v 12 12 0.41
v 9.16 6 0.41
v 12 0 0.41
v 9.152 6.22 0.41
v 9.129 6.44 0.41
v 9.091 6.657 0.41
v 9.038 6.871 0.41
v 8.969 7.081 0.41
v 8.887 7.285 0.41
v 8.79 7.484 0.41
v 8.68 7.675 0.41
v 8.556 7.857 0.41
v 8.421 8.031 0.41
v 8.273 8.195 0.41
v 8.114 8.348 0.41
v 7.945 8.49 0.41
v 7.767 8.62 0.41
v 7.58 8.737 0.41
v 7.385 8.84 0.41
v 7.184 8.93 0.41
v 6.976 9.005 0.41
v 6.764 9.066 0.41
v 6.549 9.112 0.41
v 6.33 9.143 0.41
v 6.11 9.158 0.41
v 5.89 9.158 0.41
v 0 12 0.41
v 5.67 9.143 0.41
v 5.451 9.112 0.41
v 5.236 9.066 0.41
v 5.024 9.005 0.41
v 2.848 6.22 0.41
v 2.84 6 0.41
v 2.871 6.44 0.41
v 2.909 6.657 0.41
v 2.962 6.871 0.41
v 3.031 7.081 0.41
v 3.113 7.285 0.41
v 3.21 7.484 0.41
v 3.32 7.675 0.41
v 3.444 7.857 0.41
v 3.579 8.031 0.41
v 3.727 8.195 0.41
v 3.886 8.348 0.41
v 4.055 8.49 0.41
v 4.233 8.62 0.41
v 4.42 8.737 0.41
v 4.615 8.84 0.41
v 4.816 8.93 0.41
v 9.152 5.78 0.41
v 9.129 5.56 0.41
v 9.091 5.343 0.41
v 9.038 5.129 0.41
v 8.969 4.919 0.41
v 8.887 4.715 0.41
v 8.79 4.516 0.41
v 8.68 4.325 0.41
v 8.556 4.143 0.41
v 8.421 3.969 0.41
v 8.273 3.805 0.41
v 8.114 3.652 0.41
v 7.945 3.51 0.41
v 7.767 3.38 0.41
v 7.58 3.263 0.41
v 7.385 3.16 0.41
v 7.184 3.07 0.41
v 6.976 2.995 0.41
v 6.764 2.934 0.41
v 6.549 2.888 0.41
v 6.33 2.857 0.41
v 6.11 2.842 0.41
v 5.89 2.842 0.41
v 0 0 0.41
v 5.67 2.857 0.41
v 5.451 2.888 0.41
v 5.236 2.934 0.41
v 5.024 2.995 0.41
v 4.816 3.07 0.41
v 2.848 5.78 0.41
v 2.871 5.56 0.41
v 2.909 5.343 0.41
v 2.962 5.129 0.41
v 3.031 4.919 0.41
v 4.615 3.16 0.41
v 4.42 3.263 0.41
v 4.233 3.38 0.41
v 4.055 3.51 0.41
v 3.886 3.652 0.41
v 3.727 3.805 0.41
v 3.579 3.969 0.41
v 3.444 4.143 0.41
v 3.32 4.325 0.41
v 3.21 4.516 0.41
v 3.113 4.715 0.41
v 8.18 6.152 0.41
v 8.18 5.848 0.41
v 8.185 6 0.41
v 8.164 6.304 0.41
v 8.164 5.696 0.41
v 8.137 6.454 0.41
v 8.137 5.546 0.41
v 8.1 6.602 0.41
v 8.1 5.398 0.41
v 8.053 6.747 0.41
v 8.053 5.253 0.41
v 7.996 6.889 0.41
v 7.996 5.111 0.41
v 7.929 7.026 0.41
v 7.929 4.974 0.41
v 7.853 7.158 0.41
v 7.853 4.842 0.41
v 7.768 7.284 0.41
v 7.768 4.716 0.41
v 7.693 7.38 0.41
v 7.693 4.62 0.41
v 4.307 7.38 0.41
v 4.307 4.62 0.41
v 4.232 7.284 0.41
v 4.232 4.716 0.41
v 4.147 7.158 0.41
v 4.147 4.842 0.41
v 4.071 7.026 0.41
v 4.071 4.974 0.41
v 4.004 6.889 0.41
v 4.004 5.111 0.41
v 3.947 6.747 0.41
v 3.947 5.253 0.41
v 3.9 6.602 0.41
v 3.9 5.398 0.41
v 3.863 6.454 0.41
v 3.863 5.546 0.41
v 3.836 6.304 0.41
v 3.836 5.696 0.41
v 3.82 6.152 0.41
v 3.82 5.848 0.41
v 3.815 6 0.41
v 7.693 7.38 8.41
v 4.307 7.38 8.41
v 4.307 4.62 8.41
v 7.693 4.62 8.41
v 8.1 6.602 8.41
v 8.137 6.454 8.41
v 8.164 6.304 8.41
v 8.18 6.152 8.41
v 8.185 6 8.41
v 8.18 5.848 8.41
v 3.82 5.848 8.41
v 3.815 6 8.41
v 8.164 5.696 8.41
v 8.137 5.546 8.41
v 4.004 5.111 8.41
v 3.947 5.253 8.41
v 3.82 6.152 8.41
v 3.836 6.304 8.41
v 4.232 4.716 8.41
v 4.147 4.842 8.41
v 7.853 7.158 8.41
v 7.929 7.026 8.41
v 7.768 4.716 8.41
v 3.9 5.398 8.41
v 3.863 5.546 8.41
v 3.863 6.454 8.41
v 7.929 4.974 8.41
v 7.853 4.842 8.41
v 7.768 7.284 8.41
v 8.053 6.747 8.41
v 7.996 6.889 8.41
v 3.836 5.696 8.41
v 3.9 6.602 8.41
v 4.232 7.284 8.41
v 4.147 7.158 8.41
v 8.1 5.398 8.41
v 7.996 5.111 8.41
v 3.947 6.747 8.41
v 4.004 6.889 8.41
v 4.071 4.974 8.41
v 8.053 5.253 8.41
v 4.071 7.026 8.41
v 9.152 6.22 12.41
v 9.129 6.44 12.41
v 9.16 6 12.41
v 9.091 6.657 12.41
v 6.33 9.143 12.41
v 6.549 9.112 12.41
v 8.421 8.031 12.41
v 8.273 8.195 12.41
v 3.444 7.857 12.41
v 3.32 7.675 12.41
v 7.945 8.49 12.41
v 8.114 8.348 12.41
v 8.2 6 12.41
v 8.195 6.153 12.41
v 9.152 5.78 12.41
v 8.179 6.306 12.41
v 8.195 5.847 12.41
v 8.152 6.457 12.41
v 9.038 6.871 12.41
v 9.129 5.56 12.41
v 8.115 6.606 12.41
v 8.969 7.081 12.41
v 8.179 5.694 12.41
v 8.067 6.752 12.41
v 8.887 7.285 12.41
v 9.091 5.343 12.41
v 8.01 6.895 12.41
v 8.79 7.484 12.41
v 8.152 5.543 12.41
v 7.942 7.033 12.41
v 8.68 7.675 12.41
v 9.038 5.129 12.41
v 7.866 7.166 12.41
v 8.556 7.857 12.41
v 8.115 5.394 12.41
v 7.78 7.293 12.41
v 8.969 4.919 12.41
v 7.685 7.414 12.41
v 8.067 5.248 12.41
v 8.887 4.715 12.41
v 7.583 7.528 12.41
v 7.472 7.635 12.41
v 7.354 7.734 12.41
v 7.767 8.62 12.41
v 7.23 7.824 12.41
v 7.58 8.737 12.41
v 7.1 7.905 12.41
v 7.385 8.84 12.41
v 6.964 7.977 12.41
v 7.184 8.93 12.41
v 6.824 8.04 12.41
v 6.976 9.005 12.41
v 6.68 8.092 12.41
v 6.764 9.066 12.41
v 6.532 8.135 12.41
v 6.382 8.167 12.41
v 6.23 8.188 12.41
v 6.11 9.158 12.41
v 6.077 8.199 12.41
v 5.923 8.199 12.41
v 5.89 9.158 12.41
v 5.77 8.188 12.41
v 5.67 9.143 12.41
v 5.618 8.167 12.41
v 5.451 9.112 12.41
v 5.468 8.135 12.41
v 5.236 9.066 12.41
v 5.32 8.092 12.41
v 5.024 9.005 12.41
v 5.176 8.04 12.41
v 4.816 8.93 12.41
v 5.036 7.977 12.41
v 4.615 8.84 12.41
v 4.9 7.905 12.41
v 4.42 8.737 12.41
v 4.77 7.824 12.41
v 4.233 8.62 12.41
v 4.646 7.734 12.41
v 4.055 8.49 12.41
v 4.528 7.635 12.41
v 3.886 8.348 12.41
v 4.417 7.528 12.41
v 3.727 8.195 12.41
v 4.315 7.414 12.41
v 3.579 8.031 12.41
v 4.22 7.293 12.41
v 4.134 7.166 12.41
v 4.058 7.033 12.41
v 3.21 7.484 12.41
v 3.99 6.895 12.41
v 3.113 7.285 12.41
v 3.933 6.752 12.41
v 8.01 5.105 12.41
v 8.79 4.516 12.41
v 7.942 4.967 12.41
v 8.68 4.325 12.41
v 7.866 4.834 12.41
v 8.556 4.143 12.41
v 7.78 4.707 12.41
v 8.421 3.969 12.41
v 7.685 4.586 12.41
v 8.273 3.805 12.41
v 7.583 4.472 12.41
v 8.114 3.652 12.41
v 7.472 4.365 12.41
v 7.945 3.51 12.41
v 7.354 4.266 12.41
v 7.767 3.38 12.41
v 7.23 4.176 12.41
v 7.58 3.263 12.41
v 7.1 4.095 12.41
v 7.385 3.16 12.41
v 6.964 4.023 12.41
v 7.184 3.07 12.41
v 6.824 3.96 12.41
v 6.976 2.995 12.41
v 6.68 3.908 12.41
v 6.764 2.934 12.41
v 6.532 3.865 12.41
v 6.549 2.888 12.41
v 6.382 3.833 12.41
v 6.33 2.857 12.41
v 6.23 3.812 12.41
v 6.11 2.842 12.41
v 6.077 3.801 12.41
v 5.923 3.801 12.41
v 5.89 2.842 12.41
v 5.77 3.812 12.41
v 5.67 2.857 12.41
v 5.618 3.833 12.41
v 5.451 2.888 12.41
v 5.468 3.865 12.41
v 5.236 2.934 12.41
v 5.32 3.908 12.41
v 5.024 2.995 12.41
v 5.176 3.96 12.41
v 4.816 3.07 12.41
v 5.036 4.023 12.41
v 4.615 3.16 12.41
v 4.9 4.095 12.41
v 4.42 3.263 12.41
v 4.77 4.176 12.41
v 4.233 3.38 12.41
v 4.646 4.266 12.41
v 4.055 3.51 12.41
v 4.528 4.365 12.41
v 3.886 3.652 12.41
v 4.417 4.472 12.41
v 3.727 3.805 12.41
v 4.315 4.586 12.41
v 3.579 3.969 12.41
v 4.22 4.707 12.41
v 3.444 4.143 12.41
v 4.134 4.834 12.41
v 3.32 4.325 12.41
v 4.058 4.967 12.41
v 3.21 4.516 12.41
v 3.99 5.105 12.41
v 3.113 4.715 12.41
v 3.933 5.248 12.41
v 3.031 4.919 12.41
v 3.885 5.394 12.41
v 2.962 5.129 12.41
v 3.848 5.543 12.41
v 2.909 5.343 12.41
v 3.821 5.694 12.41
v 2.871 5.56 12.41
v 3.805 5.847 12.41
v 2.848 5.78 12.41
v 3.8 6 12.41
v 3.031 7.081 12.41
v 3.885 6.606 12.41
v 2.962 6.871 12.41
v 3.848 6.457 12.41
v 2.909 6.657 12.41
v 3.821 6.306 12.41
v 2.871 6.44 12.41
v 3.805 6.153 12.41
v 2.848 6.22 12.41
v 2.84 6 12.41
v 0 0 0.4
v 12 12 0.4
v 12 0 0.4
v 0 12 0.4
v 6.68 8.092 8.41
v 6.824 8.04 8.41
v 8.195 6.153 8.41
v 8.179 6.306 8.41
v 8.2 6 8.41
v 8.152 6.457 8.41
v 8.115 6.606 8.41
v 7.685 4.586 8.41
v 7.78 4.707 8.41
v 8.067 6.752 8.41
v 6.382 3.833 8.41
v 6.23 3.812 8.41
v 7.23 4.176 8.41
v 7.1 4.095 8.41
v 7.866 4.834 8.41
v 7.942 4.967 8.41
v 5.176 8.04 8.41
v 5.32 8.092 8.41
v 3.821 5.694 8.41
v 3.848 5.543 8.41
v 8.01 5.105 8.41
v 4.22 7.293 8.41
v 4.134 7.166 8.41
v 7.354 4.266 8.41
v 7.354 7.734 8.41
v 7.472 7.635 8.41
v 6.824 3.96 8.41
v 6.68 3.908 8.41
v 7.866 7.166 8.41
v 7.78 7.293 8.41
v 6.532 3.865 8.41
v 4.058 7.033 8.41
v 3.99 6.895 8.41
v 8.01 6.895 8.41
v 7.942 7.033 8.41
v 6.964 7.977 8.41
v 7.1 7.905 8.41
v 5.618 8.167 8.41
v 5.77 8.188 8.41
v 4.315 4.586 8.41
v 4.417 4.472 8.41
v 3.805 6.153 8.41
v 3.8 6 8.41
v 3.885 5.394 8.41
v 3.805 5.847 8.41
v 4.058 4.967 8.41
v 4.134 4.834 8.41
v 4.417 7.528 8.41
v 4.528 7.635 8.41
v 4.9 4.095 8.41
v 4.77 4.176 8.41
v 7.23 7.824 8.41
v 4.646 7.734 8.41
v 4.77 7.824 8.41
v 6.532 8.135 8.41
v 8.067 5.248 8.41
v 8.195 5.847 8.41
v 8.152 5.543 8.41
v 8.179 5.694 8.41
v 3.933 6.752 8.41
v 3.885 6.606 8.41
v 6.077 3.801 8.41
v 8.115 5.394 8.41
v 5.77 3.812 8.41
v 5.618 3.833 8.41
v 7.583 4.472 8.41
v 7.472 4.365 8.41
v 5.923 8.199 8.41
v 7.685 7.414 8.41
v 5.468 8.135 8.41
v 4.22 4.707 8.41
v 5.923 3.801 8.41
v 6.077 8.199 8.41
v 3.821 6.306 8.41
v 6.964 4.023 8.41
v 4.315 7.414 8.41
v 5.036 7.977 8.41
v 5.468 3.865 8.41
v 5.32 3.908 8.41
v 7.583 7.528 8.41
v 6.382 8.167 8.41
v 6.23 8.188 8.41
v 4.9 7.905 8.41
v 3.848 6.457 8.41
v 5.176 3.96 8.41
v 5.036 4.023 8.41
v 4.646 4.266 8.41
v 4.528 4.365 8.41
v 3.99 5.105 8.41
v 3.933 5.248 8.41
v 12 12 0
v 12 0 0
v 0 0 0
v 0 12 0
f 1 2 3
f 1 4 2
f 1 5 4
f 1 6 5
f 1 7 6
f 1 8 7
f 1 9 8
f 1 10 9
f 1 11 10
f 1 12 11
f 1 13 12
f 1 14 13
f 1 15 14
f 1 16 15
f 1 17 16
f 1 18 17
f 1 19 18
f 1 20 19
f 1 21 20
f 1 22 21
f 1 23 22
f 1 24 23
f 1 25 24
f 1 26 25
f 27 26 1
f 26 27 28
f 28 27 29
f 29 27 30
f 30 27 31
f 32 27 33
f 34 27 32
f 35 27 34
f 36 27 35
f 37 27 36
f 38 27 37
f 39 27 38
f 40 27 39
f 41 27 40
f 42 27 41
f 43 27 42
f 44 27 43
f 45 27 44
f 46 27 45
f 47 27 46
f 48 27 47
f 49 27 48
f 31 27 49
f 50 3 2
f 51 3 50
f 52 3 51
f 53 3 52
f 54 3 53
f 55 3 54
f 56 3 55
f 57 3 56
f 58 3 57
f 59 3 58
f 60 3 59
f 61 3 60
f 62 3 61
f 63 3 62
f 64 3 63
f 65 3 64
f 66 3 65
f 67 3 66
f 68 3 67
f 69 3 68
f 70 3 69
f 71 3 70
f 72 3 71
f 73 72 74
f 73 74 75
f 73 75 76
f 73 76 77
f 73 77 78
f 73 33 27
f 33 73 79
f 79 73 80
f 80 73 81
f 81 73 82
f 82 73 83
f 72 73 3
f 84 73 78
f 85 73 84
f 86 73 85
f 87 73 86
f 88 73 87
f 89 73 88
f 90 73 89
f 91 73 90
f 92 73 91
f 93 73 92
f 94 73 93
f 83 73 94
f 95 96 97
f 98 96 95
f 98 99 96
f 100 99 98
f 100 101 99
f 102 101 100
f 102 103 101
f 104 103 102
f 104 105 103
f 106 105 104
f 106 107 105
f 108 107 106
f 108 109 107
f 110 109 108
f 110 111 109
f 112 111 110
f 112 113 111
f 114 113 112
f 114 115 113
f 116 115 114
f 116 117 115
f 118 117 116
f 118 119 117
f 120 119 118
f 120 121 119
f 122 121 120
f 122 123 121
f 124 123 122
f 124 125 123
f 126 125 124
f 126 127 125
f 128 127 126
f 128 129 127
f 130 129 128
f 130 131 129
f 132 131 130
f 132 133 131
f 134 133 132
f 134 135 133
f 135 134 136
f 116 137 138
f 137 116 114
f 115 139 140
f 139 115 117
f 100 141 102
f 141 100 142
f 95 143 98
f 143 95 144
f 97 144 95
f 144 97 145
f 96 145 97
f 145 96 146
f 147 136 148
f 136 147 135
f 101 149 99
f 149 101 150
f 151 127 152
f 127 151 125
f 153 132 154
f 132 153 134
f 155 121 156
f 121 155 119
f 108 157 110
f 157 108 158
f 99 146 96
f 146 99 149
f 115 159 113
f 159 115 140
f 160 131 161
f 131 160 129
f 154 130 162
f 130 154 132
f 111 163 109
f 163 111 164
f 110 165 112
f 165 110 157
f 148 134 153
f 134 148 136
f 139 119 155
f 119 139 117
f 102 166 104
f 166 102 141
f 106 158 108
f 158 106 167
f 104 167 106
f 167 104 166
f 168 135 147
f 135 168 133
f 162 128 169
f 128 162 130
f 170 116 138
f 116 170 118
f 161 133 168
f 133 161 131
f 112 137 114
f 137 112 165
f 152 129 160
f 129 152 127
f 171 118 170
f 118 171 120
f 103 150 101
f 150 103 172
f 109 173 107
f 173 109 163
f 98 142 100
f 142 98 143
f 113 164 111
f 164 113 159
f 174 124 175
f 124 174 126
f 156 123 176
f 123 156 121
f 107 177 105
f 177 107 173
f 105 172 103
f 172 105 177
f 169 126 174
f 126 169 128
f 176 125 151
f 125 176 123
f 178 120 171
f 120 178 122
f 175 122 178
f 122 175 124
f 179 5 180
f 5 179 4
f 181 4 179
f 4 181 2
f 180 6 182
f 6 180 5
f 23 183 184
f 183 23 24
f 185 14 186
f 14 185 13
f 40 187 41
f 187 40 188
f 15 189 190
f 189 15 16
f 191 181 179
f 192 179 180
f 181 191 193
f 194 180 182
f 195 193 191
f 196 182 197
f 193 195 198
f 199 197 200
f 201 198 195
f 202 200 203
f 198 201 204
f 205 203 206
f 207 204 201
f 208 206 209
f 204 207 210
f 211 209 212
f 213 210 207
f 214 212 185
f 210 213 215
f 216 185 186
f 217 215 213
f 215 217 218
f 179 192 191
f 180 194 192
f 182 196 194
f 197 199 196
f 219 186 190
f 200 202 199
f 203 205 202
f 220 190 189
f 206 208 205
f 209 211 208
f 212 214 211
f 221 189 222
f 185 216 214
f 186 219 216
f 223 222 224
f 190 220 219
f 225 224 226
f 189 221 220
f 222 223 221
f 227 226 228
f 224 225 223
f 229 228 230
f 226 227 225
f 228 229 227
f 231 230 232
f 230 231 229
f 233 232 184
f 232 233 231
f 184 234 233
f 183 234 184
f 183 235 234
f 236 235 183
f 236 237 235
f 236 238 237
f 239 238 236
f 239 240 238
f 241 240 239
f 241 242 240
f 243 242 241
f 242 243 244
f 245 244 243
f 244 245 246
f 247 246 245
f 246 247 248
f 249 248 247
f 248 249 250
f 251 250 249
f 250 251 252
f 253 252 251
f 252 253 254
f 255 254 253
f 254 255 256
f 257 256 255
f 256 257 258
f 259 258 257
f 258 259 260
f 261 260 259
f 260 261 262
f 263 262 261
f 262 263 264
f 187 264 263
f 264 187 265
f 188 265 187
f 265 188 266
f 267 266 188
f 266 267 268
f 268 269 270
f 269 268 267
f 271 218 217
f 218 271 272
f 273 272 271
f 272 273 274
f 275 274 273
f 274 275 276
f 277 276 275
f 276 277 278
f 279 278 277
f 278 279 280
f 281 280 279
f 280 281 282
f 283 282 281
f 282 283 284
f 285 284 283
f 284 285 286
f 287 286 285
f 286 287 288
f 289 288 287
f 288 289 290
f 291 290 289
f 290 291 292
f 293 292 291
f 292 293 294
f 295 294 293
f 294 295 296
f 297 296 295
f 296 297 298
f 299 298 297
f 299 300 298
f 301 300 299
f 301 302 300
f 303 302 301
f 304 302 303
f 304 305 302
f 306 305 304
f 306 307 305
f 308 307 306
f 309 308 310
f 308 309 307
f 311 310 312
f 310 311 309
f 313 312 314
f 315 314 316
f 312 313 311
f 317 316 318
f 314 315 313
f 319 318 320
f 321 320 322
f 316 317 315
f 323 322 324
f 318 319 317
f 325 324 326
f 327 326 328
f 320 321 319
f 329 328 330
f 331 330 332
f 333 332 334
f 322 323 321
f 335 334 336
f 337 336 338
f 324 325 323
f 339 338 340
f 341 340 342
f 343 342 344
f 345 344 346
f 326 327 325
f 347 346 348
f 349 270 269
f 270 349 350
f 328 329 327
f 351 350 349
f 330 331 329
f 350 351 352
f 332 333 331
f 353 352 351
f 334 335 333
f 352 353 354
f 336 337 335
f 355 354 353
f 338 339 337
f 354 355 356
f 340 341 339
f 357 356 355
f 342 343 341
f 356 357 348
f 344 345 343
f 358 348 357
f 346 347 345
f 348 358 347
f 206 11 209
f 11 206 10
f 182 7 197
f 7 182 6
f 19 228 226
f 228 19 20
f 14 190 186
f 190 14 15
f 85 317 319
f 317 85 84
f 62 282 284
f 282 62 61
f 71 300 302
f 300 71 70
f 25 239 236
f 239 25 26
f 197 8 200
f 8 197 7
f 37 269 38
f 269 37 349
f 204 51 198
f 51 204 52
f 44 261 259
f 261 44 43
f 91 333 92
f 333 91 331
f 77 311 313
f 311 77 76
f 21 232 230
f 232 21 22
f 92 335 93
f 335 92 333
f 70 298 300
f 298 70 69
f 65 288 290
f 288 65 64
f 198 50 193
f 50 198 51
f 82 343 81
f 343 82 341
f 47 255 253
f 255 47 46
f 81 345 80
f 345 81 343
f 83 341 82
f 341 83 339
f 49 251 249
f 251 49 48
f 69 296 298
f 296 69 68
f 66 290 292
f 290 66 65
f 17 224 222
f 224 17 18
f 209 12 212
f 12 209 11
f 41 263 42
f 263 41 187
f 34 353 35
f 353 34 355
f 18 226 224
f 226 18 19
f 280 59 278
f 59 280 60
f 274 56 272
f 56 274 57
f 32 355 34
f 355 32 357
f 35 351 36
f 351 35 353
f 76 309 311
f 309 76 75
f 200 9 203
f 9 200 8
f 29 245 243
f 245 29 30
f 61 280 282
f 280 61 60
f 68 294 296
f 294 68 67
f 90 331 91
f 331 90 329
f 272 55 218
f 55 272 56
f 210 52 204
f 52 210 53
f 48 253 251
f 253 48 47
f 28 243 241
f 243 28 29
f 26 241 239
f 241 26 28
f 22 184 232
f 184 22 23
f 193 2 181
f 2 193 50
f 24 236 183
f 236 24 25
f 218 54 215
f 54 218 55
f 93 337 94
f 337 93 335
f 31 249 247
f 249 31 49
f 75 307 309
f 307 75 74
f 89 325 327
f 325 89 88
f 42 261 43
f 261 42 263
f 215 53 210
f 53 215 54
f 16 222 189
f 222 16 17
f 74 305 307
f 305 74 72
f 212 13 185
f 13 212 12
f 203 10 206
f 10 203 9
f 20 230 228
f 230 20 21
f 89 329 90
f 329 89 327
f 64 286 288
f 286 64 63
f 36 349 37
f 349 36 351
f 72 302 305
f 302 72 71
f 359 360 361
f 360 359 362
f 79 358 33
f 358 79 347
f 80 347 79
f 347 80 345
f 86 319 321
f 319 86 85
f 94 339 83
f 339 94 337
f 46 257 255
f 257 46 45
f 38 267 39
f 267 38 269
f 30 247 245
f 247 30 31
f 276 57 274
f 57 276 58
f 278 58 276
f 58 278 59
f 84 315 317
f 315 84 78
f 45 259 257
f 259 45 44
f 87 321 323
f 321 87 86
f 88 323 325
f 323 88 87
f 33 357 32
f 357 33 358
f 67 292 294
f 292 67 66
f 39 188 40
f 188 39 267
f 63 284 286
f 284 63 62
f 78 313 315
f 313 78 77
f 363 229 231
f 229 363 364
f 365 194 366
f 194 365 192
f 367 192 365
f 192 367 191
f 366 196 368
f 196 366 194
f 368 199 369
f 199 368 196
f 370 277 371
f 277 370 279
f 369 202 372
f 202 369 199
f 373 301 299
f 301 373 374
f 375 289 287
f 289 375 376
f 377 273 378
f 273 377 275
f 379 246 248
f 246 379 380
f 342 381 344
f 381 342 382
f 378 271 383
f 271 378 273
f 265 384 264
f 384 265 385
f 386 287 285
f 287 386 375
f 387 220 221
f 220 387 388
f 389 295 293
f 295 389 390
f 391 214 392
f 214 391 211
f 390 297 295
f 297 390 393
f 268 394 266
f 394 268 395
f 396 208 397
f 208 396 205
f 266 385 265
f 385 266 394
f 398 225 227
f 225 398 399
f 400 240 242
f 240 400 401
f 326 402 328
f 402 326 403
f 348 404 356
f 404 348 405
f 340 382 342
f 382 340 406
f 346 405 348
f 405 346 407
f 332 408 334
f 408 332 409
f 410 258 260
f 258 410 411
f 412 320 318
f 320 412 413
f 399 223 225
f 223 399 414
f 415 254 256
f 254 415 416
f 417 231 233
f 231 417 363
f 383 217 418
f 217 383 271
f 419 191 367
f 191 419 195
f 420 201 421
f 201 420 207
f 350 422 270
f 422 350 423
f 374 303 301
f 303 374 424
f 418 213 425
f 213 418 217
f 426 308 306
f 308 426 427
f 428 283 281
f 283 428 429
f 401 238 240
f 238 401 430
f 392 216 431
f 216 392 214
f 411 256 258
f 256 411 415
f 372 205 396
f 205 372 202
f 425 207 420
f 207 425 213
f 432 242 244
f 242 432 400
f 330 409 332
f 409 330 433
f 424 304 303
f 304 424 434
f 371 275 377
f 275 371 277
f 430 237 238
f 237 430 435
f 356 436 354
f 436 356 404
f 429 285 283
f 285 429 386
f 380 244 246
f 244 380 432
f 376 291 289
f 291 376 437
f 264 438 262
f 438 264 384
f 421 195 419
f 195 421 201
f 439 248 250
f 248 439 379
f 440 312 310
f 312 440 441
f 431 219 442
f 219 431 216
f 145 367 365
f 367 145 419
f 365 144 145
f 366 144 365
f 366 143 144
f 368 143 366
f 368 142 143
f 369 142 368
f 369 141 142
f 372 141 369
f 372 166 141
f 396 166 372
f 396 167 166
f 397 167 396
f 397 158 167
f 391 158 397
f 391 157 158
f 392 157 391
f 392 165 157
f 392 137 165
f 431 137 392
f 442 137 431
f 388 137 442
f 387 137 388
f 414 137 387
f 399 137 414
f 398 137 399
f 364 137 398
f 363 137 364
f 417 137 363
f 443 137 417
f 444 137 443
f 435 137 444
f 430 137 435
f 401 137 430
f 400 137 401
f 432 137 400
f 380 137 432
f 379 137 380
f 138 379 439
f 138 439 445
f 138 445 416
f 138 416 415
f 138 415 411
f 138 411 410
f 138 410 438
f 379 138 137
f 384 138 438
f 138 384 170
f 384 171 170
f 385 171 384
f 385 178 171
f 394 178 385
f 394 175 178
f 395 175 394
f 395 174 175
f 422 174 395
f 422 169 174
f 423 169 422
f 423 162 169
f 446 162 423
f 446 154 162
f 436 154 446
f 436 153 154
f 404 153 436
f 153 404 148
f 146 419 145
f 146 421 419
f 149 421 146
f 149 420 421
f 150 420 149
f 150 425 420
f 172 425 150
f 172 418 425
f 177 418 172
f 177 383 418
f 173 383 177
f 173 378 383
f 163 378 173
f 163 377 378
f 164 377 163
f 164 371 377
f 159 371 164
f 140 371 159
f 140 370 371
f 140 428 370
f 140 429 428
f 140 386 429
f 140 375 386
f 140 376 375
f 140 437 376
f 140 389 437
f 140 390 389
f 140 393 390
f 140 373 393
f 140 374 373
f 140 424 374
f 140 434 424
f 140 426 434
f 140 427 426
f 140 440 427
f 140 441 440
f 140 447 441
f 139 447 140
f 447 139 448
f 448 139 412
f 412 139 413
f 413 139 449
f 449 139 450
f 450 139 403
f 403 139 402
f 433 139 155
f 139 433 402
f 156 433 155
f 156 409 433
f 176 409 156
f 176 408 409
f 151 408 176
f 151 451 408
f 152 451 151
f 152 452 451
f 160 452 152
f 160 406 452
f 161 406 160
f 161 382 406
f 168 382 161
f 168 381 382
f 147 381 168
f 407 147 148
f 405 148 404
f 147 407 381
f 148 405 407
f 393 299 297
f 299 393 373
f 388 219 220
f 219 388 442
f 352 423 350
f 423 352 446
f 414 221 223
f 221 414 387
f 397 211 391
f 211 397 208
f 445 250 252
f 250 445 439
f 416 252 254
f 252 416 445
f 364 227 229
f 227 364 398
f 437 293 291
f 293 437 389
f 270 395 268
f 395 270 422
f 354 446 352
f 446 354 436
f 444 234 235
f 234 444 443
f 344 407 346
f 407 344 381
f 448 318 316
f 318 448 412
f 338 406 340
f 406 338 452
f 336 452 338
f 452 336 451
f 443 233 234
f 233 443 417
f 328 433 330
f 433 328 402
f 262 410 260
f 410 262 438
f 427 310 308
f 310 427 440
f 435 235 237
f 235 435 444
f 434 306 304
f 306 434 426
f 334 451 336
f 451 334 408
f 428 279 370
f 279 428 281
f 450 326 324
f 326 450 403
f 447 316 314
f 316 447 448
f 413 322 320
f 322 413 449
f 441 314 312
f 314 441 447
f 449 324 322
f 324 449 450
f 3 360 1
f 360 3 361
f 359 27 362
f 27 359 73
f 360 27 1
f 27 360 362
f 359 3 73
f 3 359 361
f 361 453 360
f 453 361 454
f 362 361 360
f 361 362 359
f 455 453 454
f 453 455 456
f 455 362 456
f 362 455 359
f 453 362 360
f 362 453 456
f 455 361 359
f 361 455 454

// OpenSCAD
// file: ../../Base/PlacementOptions.scad
// Fischertechnik Box Foundation
// Placement Options

// Alignment
NoAlign = 0;
AlignLeft = 1;
AlignBottom = 2;
AlignCenter = 3;
AlignRight = 4;
AlignTop = 5;

// Element rotation degree steps
rotations = [0, -90, -180, -270];

// Rotation
NoRotation = 0;
Rotate0 = 0;
Rotate90 = 1;
Rotate180 = 2;
Rotate270 = 3;

// Docking (seen from above)
NoDock = -1;
DockLeft = 0;
DockTop = 1;
DockRight = 2;
DockCorner = 2;
DockBottom = 3;

// Web corners
LowerLeft = 0;
UpperLeft = 1;
UpperRight = 2;
LowerRight = 3;

// Web position relative to corner
LeftOfCorner = 0;
RightOfCorner = 1;

// Rails direction
Horizontal = true;
Vertical = false;
// file: ../../Base/Boxes.scad
// Fischertechnik Box Foundation
// Pre-designed Boxes

use <Constants.scad>

include <PlacementOptions.scad>

box190Width = 190;
box190Depth = 130;
box130Width = 130;
box130Depth = 95;

// Values are from an original ec3 box
topBottomDifference = 1.5;
outerHeight = 40;
baseThickness = 1.8;
innerHeight = outerHeight - baseThickness;
stackExcess = 5.7;
radius = 3.5;
wallThickness = 1.5;
tolerance = 0.2;

boxWallThickness = wallThickness;
boxBaseThickness = baseThickness;
boxWebWidth = 3.0;

// getBoxWallThickness()
// Gets the wall thickness of a Fischertechnik Box
function getBoxWallThickness() = boxWallThickness;

// getBoxUsageHeight(height = 38.2)
// Gets the usable height of a Fischertechnik box
// height = Outer height of the box from the bottom to the upper edge.
function getBoxUsageHeight(height = outerHeight) = height - baseThickness - stackExcess;

// getBoxInnerHeight()
// Gets the inner height of a Fischertechnik box, including the stack excess
function getBoxInnerHeight() = innerHeight;

// getBoxBaseThickness()
// Gets the thickness of the Fischertechnik box base.
function getBoxBaseThickness() = boxBaseThickness;

// getBoxWebWidth()
// Gets the width of a box web
function getBoxWebWidth() = boxWebWidth;

// getBox190Space()
// Gets the usable inner space of a Box 190 as an x/y-list
function getBox190Space() = [
    box190Width - 2*getBoxWallThickness() - topBottomDifference, 
    box190Depth - 2*getBoxWallThickness() - topBottomDifference ];

// RoundedCornerPlate(width, depth, height, radius)
// Creates a body plate with rounded corners for a box. Used
// also to create the complete box with the hull module.
// width = Width of the plate
// depth = depth of the plate 
// height = thickness of the plate
// radius = radius of the rounded corner
module RoundedCornerPlate(width, depth, height, radius) {
    translate([radius, radius])
    hull() {
        w = width-2*radius;
        d = depth-2*radius;
        cube([w, d, height]);
        cylinder(height, r=radius, $fn=getFragments());
        translate([w, 0])
            cylinder(height, r=radius, $fn=getFragments());
        translate([w, d])
            cylinder(height, r=radius, $fn=getFragments());
        translate([0, d])
            cylinder(height, r=radius, $fn=getFragments());
    }
}

// BoxBase(width, depth)
// Creates an empty stackable Fischertechnik compatible box
// width = Outer width of the box (190, 130, ...)
// depth = Outer depth of the box (130, 95, ...)

module BoxBase(width, depth, height=outerHeight) {    
    thinPlate = 0.01;

    innerHeight = height - baseThickness;    
    
    module Body(tolerance=tolerance) {
        hull() {
            // Bottom with tolerance to fit into the original boxes when stacked
            translate([-wallThickness+tolerance, -wallThickness+tolerance, -baseThickness])
                RoundedCornerPlate(width-topBottomDifference-2*tolerance, depth-topBottomDifference-2*tolerance, thinPlate, radius);
            
            // Top
            translate([-wallThickness-topBottomDifference/2, -wallThickness-topBottomDifference/2, innerHeight-thinPlate])
                RoundedCornerPlate(width, depth, thinPlate, radius);
         }
    }

    module Cutoff() {
        hull() {
            coWidth = width - 2*wallThickness;
            coDepth = depth - 2*wallThickness;
            
            // Bottom
            RoundedCornerPlate(coWidth-topBottomDifference, coDepth-topBottomDifference, thinPlate, radius);

            // Top
            translate([-topBottomDifference/2, -topBottomDifference/2, innerHeight+thinPlate]) 
                RoundedCornerPlate(coWidth, coDepth, thinPlate, radius);
        }
    }
    
    difference() {        
        Body();
        Cutoff();
        stackOffset = innerHeight - stackExcess;
        translate([0, 0, stackOffset + baseThickness])
            Body(tolerance=0);
    }
}

// Creates the Fischertechnik empty box 130x190 mm and places it at position 0,0
// 190x130 are the outer sizes, the inner space is slightly smaller. Use getBox190Space() to get the inner sizes.
// The box is positioned that the usable inner space is at the 0,0,0 position.

module Box190() {
    BoxBase(box190Width, box190Depth);
}

// Gets the usable inner space of a Box 130 as an x/y-list
function getBox130Space() = [
    box130Width - 2*getBoxWallThickness() - topBottomDifference, 
    box130Depth - 2*getBoxWallThickness() - topBottomDifference ];

// Creates the Fischertechnik empty box 95x130 mm and places it at position 0,0
// 190x130 are the outer sizes, the inner space is slightly smaller. Use getBox190Space() to get the inner sizes.
// The box is positioned that the usable inner space is at the 0,0,0 position.

module Box130() {
    BoxBase(box130Width, box130Depth);
}

// Creates a web at the specified box walls
// corner 0 = LowerLeft, 1 = UpperLeft, 2 = UpperRight, 3 = LowerRight
// side 0 = LeftOfCorner, 1 = RightOfCorner
// distance = Distance in mm from the corner
// boxSpace = inner width and depth of the box (default: Box 190)
// webWidth = length of the web (default is 3 mms)
// webThickness = thickness of the web (default is 1 mm)
// height = Height of the web (standard is getBoxUsageHeight())
// sink = How much of the web is sunk into the wall

module BoxWeb(
    corner, 
    side, 
    distance, 
    boxSpace=getBox190Space(), 
    webWidth=getBoxWebWidth(), 
    webThickness=1.0, 
    height=getBoxUsageHeight(),
    sink = getBoxWallThickness()/2) {
    width = (corner % 2 == 0) ? 
            (side == LeftOfCorner ? webWidth : webThickness) :
            (side == LeftOfCorner ? webThickness : webWidth);

    depth = (corner % 2 == 0) ? 
            (side == RightOfCorner ? webWidth : webThickness) :
            (side == RightOfCorner ? webThickness : webWidth);
    
    xDiff = corner == LowerLeft ? 
                (side == LeftOfCorner ? -sink : distance) :
            (corner == UpperLeft ?                
                (side == LeftOfCorner ? distance : -sink) :
            (corner == UpperRight ?
                (side == LeftOfCorner ? boxSpace.x-webWidth+sink : boxSpace.x-distance-webThickness) :
                (side == LeftOfCorner ? boxSpace.x-distance-webThickness: boxSpace.x-webWidth+sink)));

    yDiff = corner == LowerLeft ? 
                (side == RightOfCorner ? -sink : distance) :
            (corner == UpperLeft ?
                (side == RightOfCorner ? boxSpace.y-distance-webThickness : boxSpace.y-webWidth+sink) :
            (corner == UpperRight ?
                (side == RightOfCorner ? boxSpace.y-webWidth+sink : boxSpace.y-distance-webThickness) :
                (side == RightOfCorner ? distance : -sink)));
    
    translate([xDiff, yDiff, -getExcess()])
        cube([width, depth, height + 2*getExcess()]);
}
// file: ../../Base/Rotation.scad
// Fischertechnik Box Foundation
// Geometry Helpers Rotation

include <PlacementOptions.scad>

// getRotatedSpace(space, rotation=NoRotation)
// Rotates the space dependent on the specified rotation

function getRotatedSpace(space, rotation=NoRotation) = [
    (rotation == Rotate90 || rotation == Rotate270) ? space.y : space.x,
    (rotation == Rotate90 || rotation == Rotate270) ? space.x : space.y
];

// Rotates the given space around the fixed left lower corner
// space = the space the children needs as width/depth list [width,depth]
// rotation = 0 Rotate0 degrees, 1 Rotate90 degrees, 2 Rotate180 degrees, 3 Rotate270 degrees (equivalent to -90)

module RotateFix(space, rotation=NoRotation) {
    dy = (rotation == Rotate0 || rotation == Rotate270) ? 0 :
        (rotation == Rotate90) ? space.x :
        space.y;
    dx = (rotation < Rotate180) ? 0 :
        (rotation == Rotate180) ? space.x :
        space.y;
    
    translate([dx, dy, 0])
        rotate([0, 0, rotations[rotation]])
            children();
}
// file: ../../Base/Alignment.scad
// Fischertechnik Box Foundation
// Geometry Helpers Alignment

include <PlacementOptions.scad>

// getAlignedX(elementWidth, spaceWidth, align=AlignRight, offset=0)
// Gets the aligned X offset of an element with the given
// width in the given space.
// elementWidth = The width of the element to positon
// spaceWidth = The space where the element should be aligned
// align = 0 AlignLeft, 1 AlignCenter, 2 AlignRight
// offset = an optional offset from the aligned position. When
// aligned left or centered, then positive values are in X direction.
// When aligned right then positive values are in negative X direction.

function getAlignedX(elementWidth, spaceWidth, align=AlignRight, offset=0) =
    (align == AlignLeft) ?
        offset :
        ((align == AlignCenter) ?
        (spaceWidth - elementWidth)/2 + offset :
        spaceWidth - offset - elementWidth);

// getAlignedY(elementDepth, spaceDepth, align=AlignTop, offset=0)
// Gets the aligned Y offset of an element with the given
// depth in the given space.
// elementDepth = The depth of the element to positon
// spaceDepth = The space where the element should be aligned
// align = 0 AlignBottom, 1 AlignCenter, 2 AlignTop
// offset = an optional offset from the aligned position. When
// aligned bottom or centered, then positive values are in Y direction.
// When aligned top then positive values are in negative Y direction.

function getAlignedY(elementDepth, spaceDepth, align=AlignTop, offset=0) =
    (align == AlignBottom) ?
        offset :
        ((align == AlignCenter) ?
        (spaceDepth - elementDepth)/2 + offset :
        spaceDepth - offset - elementDepth);
// file: ../../Base/Placement.scad
// Fischertechnik Box Foundation
// Geometry Helpers Placement

use <Constants.scad>
use <Alignment.scad>
use <Rotation.scad>
use <Boxes.scad>

include <PlacementOptions.scad>

// Place(x=0, y=0, elementSpace=[0,0], alignX=AlignLeft, alignY=AlignBottom, rotation=Rotate0, boxSpace=getBox190Space())
// Places the child at the specified position
// y = Y-Position. This is a relative position when an X aligment is specified.
// x = X-Position. This is a relative position when an Y aligment is specified.
// elementSpace = space of the element to be placed [x,y]
// alignX = -1=NoAlign, 0 AlignLeft, 1 AlignCenter, 3 AlignRight (elementSpace and boxSpace required!)
// alignY = -1=NoAlign, 2 AlignBottom, 1 AlignCenter, 4 AlignTop (elementSpace and boxSpace required!)
// rotation = 0 Rotate0 0 degrees, 1 Rotate90 90 degrees, 
// 2 Rotate180 180 degrees, 3 Rotate270 270 degrees (equivalent to -90)
// boxSpace = Inner space of the box where the placement occurs [x,y] - default is Box 190x130 inner space

module Place(x=0, y=0, elementSpace=[0,0], 
  alignX=AlignLeft, alignY=AlignBottom, 
  rotation=NoRotation, boxSpace=getBox190Space()) {

    module Position(x, y, space, rotation=Rotate0) {
        translate([x, y, 0])
            RotateFix(space, rotation)
                children();
    }

    space = getRotatedSpace(elementSpace, rotation);
    alignedX = getAlignedX(space.x, boxSpace.x, alignX, x);
    alignedY = getAlignedY(space.y, boxSpace.y, alignY, y);
    Position(alignedX, alignedY, elementSpace, rotation)
        children();
}

// Center(space=getBox130Space(), elementSpace=[0,0])
// space = Space where the children is centered. For cylinder use centered=true and no elementSpace.
// elementSpace = space of the element to be centered [x,y]

module Center(space=getBox190Space(), elementSpace=[0,0]) {
    Place(elementSpace=elementSpace, boxSpace=space, alignX=AlignCenter, alignY=AlignCenter)
        children();
}

// CenterHorizontal(width=0, y=0, offset=0, space=getBox130Space())
// width = Width of the element to be placed.
// y = Y position of the element
// offset = Offset from the center position (negative will be left of the center)
// space = Space where the element is placed

module CenterHorizontal(width=0, y=0, offset=0, space=getBox190Space()) {
    Place(x=offset, y=y, elementSpace=[width, 0], boxSpace=space, alignX=AlignCenter)
        children(0);
}

// CenterVertical(depth=0, x=0, offset=0, space=getBox130Space())
// depth = Depth of the element to be placed.
// x = X position of the element
// offset = Offset from the center position (negative will be down of the center)
// space = Space where the element is placed

module CenterVertical(depth=0, x=0, offset=0, space=getBox190Space()) {
    Place(x=x, y=offset, elementSpace=[0, depth], boxSpace=space, alignY=AlignCenter)
        children(0);
}

// getIsVertical(align)
// True if the specified alignment needs a vertical orientation for a divider (AlignRight, AlignLeft)

function getIsVertical(align) = (align == AlignRight || align == AlignLeft);

// getIsHorizontal(align)
// True if the specified alignment needs a horizontal orientation for a divider (AlignTop, AlignBottom)

function getIsHorizontal(align) = (align == AlignTop || align == AlignBottom);
// file: ../../Elements/AxisClip10.scad
// Fischertechnik Box Library
// Axis for clip 10
// 31023

use <../ModelBase/Simple.scad>
use <../Base/Constants.scad>

/* [Element Parameters] */
height = 23;
clipHeight = 10;

/* [Hidden] */
width = 12;
depth = 12;
upperDiameter = 3.6;

// getAxisClip10Space()
// Gets the space of a n axis for a clip 10 with spring ring (mot2)

function getAxisClip10Space() = [width, depth, height];

// AxisClip10(height, clipHeight)
// Axis for clip 10 with spring ring (mot2)
// height = Height of the complete axis (standard is 23, in mot3 its only 12)
// clipHeight = Height of the part for the clip (standard is 10, in mot3 its only 7)

module AxisClip10(height=height, clipHeight=clipHeight) {
    LeveledAxisWithSpace(height, height-clipHeight, getAxisClip10Space(), diameter=upperDiameter);
}

// Test
color("lightgray")
AxisClip10(height, clipHeight);
// file: ../../Base/Constants.scad
// Fischertechnik Box Foundation
// Constants

// Constant values necessary for multiple elements

// Base constants
dividerThickness = 1.2;
excess = 0.01;
fragments = 90;
tolerance = 0.8;

// Gets the thickness of a divider 
function getDividerThickness() = dividerThickness;

// Gets the excess that is used to merge walls into each other
function getExcess() = excess;

// Gets amount of fragments of a cylinder
function getFragments() = fragments;

// Gets the inner tolerance of a frame to each side
function getTolerance() = tolerance;


// Fischertechnik specific constants
axisDiameter = 4;
axisBottomDiameter = axisDiameter + 1;
axisTolerance = 0.2;
axisLockingLength = 8;

// Gets axis diameter of Fischertechnik axis
function getAxisDiameter() = axisDiameter;

// Gets axis diameter tolerance (subtracted for element axis)
function getAxisTolerance() = axisTolerance;

// Gets the axis diameter for standing axis
function getStandAxisDiameter() = getAxisDiameter() - getAxisTolerance();

// Gets axis bottom diameter for thicker part at the bottom
function getAxisBottomDiameter() = axisBottomDiameter;

// Gets the lengthh of the locking part of a locking axis
function getAxisLockingLength() = axisLockingLength;

// Studs

studHeight = 2.5;
studTolerance = 0.2;
studRailDistance = 9;   // as in ft 50

// gets the height of a connecting stud
function getStudHeight() = studHeight;

// gets the connecting stud height tolerance
function getStudTolerance() = studTolerance;

// gets the default rail distance for studs
function getStudRailDistance() = studRailDistance;

// Dockable Frame with Edge

standardEdgeDistance = 2.5;
standardWebDistance = 11.5;
standardCornerLength = 15;

// gets the standard distance to the wall of the box for dockable frames with webs
function getStandardEdgeDistance() = standardEdgeDistance;

// gets the standard distance of each web to the corner of the dockable frame
function getStandardWebDistance() = standardWebDistance;

// gets the standard length of the corner walls of a dockable frame
function getStandardCornerLength() = standardCornerLength;

// Tubes

tubeWallFactor = 0.8;

// gets the wall thickness of a tube.
function getTubeWallThickness() = tubeWallFactor * getDividerThickness();

// Small Parts and Divider Frame

smallPartsFrameHeight = 20;

// gets the frame height for docked small parts boxes.
function getSmallPartsFrameHeight() = smallPartsFrameHeight;

// Hubs

hubRingDiameter = 19.5;
hubRingLevelDiameter = 21;

// gets the diameter of a tube matching the inner ring of a wheel
function getHubRingDiameter() = hubRingDiameter;

// gets the diameter of a hub tube with a thicker diameter
function getHubRingLevelDiameter() = hubRingLevelDiameter;

// Struts

strutAddLength = 9.0;
strutDepth = 8.0;

// gets the full length of a strut
function getFullStrutLength(length) = length + strutAddLength;

// gets the radius of the end of a strut
function getStrutEndRadius() = strutAddLength / 2;

// gets the the depth of a strut
function getStrutDepth() = strutDepth;

// Propeller

propellerAxisDiameter = 7.0;
propellerAxisTolerance = 0.2;

// gets the propeller axis outer diameter
function getPropellerAxisDiameter() = propellerAxisDiameter;

// gets the propeller axis printing tolerance
function getPropellerAxisTolerance() = propellerAxisTolerance;
// file: ../../Elements/CylinderLockingBevelGear.scad
// Fischertechnik Box Library
// Cylinder for standing locking bevel gear
// 35061

use <../Base/Constants.scad>
use <../Base/Placement.scad>
use <../ModelBase/Simple.scad>

/* [Hidden] */
width = 12;
depth = 12;
height = 12;

// getCylinderLockingBevelGearSpace()
// Gets the space the cylinder for a locking bevel gear

function getCylinderLockingBevelGearSpace() = [width, depth, height];

// CylinderLockingBevelGear()
// Standing cylinder for a locking bevel gear
// 35061

module CylinderLockingBevelGear() {
    Space(getCylinderLockingBevelGearSpace());
    
    Center(getCylinderLockingBevelGearSpace())
        LockingTube(height);
}

// Tests
color("lightgray")
CylinderLockingBevelGear();
// file: ../TestPrint.scad
// 3D Print Test Base

use <../Base/Constants.scad>

use <../Elements/AxisClip10.scad>

module TestPrint(elementSpace) {
    cube([elementSpace.x, elementSpace.y, 0.4]);
    translate([0,0,0.4+getExcess()]) {
        children();
    }
}

TestPrint(getAxisClip10Space())
    AxisClip10();
// main file
// 3D Print Test
// CylinderLockingBevelGear

use <../TestPrint.scad>
use <../../Elements/CylinderLockingBevelGear.scad>

TestPrint(getCylinderLockingBevelGearSpace())
    CylinderLockingBevelGear();
